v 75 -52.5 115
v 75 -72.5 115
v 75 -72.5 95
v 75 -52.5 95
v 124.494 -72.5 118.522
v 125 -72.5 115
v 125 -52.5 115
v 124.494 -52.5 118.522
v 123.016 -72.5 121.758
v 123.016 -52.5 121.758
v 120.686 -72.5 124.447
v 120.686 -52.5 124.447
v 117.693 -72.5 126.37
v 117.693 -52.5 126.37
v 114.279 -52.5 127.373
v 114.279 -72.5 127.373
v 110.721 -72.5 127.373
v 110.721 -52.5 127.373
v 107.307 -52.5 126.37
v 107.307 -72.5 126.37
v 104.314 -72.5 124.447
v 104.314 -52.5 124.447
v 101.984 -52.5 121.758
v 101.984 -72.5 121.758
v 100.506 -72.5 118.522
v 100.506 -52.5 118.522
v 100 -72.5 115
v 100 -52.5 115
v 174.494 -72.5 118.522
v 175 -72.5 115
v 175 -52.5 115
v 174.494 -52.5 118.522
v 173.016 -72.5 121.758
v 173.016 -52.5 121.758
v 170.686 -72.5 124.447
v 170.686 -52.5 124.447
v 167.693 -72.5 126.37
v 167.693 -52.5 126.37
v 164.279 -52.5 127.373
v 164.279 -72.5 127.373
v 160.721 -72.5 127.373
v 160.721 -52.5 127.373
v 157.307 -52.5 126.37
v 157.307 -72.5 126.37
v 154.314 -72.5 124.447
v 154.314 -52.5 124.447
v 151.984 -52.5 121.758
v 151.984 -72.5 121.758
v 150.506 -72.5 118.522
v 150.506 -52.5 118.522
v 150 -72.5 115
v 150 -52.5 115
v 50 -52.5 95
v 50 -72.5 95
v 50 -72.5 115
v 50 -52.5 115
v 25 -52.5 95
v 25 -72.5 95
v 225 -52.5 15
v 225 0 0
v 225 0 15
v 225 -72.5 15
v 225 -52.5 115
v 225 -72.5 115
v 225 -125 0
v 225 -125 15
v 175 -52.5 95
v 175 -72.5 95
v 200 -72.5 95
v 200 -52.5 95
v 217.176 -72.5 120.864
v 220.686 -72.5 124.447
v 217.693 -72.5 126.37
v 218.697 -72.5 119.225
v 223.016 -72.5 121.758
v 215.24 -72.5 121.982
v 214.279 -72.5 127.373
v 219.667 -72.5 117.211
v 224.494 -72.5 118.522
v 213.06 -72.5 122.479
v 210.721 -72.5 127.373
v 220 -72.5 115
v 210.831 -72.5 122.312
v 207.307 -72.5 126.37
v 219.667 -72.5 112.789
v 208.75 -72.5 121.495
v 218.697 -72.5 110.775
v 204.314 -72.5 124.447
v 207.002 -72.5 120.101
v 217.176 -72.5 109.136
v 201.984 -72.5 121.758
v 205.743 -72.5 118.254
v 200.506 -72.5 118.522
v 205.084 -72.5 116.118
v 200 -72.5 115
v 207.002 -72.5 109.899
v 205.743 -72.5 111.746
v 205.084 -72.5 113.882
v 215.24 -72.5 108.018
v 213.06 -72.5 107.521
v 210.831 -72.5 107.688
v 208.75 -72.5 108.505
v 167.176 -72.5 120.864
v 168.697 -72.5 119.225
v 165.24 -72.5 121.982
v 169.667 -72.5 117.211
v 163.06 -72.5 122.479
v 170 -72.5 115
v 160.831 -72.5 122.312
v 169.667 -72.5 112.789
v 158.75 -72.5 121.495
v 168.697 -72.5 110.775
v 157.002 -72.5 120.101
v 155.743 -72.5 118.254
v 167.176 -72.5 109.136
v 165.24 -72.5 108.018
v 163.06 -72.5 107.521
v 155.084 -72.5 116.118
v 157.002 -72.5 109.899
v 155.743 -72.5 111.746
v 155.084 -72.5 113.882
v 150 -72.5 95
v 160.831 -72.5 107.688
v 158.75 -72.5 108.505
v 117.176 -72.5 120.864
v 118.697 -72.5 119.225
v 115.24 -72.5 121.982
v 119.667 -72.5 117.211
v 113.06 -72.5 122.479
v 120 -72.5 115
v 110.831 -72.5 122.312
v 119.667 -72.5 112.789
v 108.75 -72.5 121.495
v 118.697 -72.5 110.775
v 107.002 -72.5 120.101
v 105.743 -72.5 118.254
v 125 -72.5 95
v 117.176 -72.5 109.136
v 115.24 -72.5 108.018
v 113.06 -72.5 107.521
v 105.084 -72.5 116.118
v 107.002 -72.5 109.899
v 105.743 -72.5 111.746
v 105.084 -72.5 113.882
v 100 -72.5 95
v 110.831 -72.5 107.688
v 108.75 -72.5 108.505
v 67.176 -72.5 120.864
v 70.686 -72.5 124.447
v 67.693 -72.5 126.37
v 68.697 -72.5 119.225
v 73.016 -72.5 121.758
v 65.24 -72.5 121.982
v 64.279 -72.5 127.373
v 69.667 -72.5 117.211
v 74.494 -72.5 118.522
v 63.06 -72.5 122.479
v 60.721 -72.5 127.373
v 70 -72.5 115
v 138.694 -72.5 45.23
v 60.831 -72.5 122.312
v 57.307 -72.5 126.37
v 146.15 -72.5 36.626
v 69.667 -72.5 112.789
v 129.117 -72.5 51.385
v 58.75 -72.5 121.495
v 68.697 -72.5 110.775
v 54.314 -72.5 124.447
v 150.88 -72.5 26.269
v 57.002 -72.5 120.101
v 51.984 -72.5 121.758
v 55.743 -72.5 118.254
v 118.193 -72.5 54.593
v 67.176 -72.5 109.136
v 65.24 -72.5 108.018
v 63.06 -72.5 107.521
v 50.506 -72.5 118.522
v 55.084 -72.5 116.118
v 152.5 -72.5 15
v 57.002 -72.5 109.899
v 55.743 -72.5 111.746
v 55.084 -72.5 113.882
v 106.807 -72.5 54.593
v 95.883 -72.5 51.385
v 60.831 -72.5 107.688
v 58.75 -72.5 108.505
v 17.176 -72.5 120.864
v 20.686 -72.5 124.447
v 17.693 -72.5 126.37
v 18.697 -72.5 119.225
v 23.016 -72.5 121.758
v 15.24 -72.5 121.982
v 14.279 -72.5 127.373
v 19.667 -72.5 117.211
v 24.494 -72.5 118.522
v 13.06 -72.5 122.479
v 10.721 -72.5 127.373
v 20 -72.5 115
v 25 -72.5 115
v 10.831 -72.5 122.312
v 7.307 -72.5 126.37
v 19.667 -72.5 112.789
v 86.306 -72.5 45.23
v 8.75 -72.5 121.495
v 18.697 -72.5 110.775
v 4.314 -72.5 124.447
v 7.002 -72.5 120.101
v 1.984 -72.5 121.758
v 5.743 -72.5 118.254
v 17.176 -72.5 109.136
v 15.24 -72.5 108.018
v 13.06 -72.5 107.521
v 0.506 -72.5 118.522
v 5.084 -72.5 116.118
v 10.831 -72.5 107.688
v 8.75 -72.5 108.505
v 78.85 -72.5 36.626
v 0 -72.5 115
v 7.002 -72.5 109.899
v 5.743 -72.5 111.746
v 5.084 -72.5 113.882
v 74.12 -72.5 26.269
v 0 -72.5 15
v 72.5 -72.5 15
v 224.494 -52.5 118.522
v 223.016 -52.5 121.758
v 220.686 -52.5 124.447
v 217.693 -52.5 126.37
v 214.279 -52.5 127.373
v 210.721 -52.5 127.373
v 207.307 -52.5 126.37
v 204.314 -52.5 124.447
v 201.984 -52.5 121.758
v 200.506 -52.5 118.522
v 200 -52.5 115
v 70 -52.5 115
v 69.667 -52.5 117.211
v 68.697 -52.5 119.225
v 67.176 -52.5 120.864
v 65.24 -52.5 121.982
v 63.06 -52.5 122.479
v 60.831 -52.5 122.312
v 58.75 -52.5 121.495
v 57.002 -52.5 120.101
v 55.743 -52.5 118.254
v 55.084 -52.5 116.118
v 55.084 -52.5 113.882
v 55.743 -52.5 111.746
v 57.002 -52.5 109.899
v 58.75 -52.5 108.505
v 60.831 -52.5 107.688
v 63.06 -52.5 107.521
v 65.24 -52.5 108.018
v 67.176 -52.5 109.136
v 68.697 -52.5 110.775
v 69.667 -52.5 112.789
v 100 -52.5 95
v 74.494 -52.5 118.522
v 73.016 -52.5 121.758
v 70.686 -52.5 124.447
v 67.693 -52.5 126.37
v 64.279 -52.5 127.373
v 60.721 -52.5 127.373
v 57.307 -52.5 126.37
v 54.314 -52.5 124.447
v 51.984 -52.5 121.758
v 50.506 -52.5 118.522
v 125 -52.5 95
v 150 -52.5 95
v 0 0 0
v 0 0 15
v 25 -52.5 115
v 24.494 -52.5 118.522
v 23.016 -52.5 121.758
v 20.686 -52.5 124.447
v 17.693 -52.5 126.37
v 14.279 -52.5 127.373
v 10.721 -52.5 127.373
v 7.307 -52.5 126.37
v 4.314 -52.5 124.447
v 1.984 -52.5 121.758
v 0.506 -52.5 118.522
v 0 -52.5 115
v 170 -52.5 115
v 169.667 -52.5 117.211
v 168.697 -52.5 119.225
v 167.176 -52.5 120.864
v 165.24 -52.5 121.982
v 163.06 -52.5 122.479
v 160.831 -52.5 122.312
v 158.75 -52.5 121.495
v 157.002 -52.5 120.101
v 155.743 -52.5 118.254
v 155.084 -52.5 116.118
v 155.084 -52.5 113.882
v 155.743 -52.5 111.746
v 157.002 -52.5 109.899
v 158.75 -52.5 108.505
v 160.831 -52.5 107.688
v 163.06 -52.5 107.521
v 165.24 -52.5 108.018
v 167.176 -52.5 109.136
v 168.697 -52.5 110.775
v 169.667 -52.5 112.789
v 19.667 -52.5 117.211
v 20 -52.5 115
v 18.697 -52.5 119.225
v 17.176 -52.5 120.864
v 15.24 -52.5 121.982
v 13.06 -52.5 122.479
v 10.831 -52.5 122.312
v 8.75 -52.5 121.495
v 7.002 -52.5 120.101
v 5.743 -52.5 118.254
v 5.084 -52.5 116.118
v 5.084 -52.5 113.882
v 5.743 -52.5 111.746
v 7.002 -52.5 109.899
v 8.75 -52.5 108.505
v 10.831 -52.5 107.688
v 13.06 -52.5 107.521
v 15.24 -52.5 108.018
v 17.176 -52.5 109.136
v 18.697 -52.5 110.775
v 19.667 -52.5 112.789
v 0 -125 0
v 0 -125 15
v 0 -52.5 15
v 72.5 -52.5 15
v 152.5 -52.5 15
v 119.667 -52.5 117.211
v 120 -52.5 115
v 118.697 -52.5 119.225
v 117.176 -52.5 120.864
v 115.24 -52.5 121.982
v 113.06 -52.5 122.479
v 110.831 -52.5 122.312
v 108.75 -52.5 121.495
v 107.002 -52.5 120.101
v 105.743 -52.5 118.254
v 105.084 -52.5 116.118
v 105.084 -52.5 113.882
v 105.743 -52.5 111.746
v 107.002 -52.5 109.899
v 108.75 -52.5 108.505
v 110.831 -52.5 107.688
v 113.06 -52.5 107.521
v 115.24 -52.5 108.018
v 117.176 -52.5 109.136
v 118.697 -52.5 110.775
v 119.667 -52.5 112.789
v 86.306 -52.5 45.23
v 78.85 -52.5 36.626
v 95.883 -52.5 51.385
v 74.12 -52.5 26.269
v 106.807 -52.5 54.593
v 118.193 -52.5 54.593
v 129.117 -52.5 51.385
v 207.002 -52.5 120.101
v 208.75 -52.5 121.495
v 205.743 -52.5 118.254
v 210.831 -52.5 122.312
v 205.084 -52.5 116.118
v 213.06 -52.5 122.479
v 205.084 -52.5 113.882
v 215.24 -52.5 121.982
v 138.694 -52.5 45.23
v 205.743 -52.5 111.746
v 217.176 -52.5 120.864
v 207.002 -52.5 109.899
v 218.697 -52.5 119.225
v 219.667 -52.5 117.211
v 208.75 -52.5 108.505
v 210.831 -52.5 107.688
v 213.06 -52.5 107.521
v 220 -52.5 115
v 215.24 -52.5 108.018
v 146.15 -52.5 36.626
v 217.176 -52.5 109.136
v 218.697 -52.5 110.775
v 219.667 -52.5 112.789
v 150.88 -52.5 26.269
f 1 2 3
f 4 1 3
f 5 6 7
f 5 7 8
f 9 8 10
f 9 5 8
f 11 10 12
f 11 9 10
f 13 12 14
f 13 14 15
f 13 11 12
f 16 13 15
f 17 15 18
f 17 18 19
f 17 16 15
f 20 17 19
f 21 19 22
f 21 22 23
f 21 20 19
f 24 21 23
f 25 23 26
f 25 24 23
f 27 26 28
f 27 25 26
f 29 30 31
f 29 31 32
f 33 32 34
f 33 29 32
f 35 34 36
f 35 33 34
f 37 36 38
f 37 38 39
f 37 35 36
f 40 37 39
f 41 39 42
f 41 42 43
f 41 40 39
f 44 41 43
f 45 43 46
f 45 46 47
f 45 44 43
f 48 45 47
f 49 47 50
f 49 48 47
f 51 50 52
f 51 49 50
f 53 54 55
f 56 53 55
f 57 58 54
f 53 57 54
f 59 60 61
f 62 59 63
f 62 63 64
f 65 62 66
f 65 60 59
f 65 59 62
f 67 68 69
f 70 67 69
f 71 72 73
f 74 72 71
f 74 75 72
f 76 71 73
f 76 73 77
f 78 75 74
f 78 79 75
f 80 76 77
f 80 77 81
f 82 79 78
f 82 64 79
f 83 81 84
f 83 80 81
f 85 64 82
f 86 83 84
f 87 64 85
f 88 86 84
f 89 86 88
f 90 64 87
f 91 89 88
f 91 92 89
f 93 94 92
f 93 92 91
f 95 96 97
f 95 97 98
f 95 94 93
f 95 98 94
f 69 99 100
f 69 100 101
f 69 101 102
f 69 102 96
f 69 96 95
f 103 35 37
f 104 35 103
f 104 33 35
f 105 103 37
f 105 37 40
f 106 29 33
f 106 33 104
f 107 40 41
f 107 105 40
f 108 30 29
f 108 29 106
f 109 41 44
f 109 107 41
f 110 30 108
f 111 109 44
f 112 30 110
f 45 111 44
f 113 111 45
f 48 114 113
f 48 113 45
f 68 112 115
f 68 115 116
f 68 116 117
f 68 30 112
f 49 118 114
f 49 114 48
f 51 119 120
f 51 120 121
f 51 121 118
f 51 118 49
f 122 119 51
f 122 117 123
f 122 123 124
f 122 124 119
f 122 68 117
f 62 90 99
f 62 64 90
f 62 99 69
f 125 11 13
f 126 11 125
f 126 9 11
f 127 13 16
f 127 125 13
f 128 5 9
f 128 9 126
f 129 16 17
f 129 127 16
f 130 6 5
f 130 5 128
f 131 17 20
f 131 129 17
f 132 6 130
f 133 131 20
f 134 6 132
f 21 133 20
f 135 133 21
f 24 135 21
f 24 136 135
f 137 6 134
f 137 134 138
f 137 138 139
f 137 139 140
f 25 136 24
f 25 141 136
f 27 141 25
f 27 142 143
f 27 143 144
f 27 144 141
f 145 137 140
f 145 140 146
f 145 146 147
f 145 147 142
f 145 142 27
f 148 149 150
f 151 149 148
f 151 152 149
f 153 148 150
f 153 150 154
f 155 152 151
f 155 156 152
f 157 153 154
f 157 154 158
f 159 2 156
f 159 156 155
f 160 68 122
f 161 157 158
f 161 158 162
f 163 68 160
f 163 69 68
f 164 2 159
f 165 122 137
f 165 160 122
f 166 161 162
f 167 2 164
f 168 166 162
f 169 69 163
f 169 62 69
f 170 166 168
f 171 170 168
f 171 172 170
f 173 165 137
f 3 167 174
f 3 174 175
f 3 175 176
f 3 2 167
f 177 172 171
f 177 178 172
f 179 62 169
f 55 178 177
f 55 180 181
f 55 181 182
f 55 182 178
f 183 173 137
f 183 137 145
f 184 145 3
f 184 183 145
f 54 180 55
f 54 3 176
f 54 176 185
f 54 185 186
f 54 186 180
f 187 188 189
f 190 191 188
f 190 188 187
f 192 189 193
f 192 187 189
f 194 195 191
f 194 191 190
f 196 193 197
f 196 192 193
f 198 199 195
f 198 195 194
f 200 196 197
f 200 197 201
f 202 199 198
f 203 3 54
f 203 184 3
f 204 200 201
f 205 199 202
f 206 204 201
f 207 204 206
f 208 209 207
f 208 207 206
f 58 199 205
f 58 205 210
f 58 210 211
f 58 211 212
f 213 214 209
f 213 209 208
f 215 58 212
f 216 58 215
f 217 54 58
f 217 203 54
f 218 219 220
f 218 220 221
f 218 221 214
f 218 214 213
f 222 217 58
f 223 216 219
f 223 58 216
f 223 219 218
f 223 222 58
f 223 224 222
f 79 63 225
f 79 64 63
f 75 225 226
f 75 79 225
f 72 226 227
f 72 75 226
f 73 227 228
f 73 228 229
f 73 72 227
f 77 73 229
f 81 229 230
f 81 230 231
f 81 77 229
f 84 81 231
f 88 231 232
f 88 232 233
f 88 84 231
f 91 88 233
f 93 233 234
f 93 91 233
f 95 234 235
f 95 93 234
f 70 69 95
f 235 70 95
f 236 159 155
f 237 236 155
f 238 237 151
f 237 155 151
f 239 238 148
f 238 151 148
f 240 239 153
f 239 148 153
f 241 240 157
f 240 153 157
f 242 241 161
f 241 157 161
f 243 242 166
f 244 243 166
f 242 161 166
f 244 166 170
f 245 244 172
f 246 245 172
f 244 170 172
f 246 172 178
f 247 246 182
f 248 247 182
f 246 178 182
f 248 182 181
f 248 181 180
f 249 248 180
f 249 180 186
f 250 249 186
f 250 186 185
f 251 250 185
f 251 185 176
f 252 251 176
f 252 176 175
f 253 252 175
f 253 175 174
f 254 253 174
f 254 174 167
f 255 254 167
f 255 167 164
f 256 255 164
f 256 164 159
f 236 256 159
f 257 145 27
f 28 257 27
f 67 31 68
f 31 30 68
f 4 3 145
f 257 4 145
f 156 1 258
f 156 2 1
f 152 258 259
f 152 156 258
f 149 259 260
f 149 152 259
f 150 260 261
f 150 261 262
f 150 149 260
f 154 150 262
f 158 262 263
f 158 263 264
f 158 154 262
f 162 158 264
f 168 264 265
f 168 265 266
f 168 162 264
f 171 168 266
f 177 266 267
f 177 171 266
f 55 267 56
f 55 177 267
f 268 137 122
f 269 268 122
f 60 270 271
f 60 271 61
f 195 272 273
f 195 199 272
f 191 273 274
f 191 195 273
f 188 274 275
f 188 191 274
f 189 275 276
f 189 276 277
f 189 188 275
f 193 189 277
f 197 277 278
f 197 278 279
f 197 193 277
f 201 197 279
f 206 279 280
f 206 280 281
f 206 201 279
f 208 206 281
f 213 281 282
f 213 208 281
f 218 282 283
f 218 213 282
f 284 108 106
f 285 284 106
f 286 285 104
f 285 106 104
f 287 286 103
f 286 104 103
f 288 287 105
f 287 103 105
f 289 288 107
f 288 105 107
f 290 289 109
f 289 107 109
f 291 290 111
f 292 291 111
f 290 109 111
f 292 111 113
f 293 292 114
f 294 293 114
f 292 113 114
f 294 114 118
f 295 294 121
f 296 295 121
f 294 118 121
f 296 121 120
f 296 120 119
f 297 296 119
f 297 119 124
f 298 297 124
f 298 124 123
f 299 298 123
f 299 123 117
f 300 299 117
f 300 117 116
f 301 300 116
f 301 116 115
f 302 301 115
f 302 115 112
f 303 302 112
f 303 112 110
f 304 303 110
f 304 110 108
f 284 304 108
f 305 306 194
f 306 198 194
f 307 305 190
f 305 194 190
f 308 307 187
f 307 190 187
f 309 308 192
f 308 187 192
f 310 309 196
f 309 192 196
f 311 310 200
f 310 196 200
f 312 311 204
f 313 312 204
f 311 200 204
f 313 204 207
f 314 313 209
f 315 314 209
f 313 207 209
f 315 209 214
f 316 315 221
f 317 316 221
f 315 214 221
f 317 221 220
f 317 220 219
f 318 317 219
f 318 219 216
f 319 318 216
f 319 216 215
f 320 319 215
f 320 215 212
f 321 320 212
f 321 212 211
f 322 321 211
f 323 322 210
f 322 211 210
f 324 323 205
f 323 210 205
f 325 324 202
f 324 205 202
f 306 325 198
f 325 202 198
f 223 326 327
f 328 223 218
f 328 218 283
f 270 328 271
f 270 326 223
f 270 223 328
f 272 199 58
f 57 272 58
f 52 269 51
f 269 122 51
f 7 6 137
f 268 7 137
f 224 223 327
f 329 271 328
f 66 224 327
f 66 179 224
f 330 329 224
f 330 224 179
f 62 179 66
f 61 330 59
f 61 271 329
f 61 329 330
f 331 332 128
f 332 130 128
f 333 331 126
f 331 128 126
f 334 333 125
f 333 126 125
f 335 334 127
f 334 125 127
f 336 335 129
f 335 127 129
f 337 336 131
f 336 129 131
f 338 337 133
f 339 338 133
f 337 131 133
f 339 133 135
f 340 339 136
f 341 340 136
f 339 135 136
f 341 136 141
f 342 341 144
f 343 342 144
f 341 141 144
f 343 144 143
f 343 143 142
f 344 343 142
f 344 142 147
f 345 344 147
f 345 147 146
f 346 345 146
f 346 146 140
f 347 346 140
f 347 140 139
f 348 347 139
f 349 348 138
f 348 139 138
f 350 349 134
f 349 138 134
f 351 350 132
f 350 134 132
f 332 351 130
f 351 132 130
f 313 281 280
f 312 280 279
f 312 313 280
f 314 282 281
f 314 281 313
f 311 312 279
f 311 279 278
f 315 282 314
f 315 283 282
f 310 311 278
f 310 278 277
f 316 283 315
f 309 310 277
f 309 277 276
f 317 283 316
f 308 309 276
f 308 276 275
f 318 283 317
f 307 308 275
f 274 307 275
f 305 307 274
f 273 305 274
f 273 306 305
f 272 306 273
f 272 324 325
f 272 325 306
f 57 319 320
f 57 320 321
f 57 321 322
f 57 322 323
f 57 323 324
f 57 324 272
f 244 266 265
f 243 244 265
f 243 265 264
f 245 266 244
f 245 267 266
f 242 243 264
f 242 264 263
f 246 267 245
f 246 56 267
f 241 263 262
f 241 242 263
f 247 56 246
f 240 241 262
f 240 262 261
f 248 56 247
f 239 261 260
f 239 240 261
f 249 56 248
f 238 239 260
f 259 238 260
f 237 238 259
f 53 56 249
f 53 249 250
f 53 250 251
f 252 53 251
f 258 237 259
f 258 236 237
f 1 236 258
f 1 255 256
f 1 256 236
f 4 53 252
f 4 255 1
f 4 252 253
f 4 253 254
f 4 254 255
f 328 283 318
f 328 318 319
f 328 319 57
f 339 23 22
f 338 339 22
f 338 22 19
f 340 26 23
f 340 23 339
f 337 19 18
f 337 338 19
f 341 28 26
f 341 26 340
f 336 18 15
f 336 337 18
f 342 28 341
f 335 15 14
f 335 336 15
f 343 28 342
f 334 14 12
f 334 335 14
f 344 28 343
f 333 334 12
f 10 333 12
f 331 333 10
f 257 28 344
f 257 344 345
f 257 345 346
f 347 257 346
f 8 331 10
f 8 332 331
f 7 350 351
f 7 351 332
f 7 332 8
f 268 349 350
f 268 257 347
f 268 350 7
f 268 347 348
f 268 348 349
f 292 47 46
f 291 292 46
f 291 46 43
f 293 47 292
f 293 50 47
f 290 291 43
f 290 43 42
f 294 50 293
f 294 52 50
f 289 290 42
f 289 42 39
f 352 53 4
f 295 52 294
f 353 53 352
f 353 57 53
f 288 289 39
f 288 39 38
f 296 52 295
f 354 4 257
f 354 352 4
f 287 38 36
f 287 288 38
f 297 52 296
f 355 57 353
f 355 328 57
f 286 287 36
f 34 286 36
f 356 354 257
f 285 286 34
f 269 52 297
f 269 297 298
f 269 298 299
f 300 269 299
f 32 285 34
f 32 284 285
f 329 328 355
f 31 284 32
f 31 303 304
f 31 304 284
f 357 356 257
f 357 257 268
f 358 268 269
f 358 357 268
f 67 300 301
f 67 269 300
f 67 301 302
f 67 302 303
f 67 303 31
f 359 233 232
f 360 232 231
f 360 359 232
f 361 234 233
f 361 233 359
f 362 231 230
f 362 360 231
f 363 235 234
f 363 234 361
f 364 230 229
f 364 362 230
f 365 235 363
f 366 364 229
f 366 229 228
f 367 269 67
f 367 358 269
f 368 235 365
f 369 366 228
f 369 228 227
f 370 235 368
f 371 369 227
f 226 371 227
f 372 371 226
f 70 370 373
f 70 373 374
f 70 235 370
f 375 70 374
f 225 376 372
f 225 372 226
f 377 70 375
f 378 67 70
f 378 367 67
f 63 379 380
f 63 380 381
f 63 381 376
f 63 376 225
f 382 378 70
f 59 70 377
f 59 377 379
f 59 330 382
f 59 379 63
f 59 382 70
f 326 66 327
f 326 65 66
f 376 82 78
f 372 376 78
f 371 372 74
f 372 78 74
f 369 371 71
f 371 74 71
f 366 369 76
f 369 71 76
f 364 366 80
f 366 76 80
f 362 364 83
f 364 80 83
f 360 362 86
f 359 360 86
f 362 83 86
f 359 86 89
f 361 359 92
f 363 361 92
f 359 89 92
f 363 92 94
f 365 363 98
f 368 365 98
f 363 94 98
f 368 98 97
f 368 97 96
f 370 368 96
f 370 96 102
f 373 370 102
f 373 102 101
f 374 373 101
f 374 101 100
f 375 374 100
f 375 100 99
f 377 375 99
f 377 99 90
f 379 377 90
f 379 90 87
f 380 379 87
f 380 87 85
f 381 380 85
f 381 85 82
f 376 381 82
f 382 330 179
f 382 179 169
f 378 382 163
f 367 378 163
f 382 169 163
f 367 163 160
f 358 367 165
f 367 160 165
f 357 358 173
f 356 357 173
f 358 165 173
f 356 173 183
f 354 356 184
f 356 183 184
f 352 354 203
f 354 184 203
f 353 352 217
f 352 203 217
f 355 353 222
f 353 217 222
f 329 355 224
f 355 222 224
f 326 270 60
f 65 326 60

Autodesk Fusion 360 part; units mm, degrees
sketch "Sketch5" plane through (0, 0, 0) normal (0, 0, 1) x (1, 0, 0)
  line L0 (0, 0) -> (225, 0)
  line L1 (225, 0) -> (225, -125)
  line L2 (225, -125) -> (0, -125)
  line L3 (0, -125) -> (0, 0)
  dimension "d26" = 225
  dimension "d27" = 125
extrude "Extrude3" add sketch "Sketch5" along normal blind 15
sketch "Sketch6" plane through (0, 0, 15) normal (0, 0, 1) x (-1, 0, 0)
  line L0 (0, 125) -> (-225, 125)
  line L1 (-225, 125) -> (-225, 0)
  line L2 (-225, 0) -> (0, 0)
  line L3 (0, 0) -> (0, 125)
  line L4 (0, 0) -> (0, 62.5) construction
  line L5 (0, 62.5) -> (-225, 62.5) construction
  line L6 (0, 62.5) -> (0, 52.5)
  line L7 (0, 62.5) -> (0, 72.5)
  line L8 (0, 52.5) -> (-225, 52.5)
  line L9 (-225, 52.5) -> (-225, 72.5)
  line L10 (-225, 72.5) -> (0, 72.5)
  dimension "d30" = 62.5
  dimension "d31" = 10
  dimension "d32" = 10
  dimension "d33" = 225
  dimension "d34" = 20
extrude "Extrude4" add sketch "Sketch6" along normal blind 100 contours L1 L3 L6 L7 L8 L9 L10
sketch "Sketch7" plane through (0, -72.5, 0) normal (0, -1, 0) x (1, 0, 0)
  line L0 (0, 15) -> (225, 15)
  line L1 (225, 15) -> (225, 115)
  line L2 (225, 115) -> (0, 115)
  line L3 (0, 115) -> (0, 15)
  line L4 (0, 15) -> (72.5, 15) construction
  arc A0 (152.5, 15) -> (72.5, 15) centre (112.5, 15) ccw
  line L5 (0, 115) -> (25, 115)
  line L6 (25, 115) -> (50, 115)
  line L7 (50, 115) -> (75, 115)
  line L8 (75, 115) -> (100, 115)
  line L9 (100, 115) -> (125, 115)
  line L10 (125, 115) -> (150, 115)
  line L11 (150, 115) -> (175, 115)
  line L12 (175, 115) -> (200, 115)
  line L13 (200, 115) -> (225, 115)
  circle A1 centre (12.5, 115) radius 7.5
  circle A2 centre (62.5, 115) radius 7.5
  circle A3 centre (112.5, 115) radius 7.5
  circle A4 centre (162.5, 115) radius 7.5
  circle A5 centre (212.5, 115) radius 7.5
  line L14 (25, 115) -> (25, 95)
  line L15 (25, 95) -> (50, 95)
  line L16 (50, 95) -> (50, 115)
  line L17 (75, 115) -> (75, 95)
  line L18 (75, 95) -> (100, 95)
  line L19 (100, 95) -> (100, 115)
  line L20 (125, 115) -> (125, 95)
  line L21 (125, 95) -> (150, 95)
  line L22 (150, 95) -> (150, 115)
  line L23 (175, 115) -> (175, 95)
  line L24 (175, 95) -> (200, 95)
  line L25 (200, 95) -> (200, 115)
  arc A6 (25, 115) -> (0, 115) centre (12.5, 115) ccw
  arc A7 (75, 115) -> (50, 115) centre (62.5, 115) ccw
  arc A8 (125, 115) -> (100, 115) centre (112.5, 115) ccw
  arc A9 (175, 115) -> (150, 115) centre (162.5, 115) ccw
  arc A10 (225, 115) -> (200, 115) centre (212.5, 115) ccw
  point P0 (62.5, 115)
  point P1 (112.5, 115)
  point P2 (162.5, 115)
  point P3 (212.5, 115)
  dimension "d37" = 112.5
  dimension "d38" = 80
  dimension "d42" = 25
  dimension "d43" = 25
  dimension "d44" = 25
  dimension "d45" = 25
  dimension "d46" = 25
  dimension "d47" = 25
  dimension "d48" = 25
  dimension "d49" = 25
  dimension "d50" = 25
  dimension "d51" = 15
  dimension "d52" = 25
  dimension "d55" = 200
  dimension "d56" = 0
  dimension "d57" = 20
  dimension "d62" = 100
extrude "Extrude5" cut sketch "Sketch7" against normal blind 20 contours L0 A0
extrude "Extrude6" add sketch "Sketch7" against normal blind 20 contours L2 L5 A1 A6 | L2 L5 A1 | L2 L5 A1 | L2 L7 A2 A7 | L2 L13 A5 A10 | L2 L7 A2 | L2 L13 A5 | L2 L9 A3 A8 | L2 L11 A4 A9 | L2 L9 A3 | L2 L11 A4 picked at (63.3854, 117.6998) picked at (214.3326, 116.7004) picked at (113.3854, 117.6998) picked at (164.3326, 116.7004)
extrude "Extrude7" cut sketch "Sketch7" against normal blind 20 contours L2 L6 L14 L15 L16 | L2 L8 L17 L18 L19 | L2 L12 L23 L24 L25 | L2 L10 L20 L21 L22
extrude "Extrude8" cut sketch "Sketch7" against normal blind 20 contours L2 L5 A1 | L2 L5 A1 | L2 L7 A2 | L2 L7 A2 | L2 L13 A5 | L2 L13 A5 | L2 L9 A3 | L2 L9 A3 | L2 L11 A4 | L2 L11 A4
